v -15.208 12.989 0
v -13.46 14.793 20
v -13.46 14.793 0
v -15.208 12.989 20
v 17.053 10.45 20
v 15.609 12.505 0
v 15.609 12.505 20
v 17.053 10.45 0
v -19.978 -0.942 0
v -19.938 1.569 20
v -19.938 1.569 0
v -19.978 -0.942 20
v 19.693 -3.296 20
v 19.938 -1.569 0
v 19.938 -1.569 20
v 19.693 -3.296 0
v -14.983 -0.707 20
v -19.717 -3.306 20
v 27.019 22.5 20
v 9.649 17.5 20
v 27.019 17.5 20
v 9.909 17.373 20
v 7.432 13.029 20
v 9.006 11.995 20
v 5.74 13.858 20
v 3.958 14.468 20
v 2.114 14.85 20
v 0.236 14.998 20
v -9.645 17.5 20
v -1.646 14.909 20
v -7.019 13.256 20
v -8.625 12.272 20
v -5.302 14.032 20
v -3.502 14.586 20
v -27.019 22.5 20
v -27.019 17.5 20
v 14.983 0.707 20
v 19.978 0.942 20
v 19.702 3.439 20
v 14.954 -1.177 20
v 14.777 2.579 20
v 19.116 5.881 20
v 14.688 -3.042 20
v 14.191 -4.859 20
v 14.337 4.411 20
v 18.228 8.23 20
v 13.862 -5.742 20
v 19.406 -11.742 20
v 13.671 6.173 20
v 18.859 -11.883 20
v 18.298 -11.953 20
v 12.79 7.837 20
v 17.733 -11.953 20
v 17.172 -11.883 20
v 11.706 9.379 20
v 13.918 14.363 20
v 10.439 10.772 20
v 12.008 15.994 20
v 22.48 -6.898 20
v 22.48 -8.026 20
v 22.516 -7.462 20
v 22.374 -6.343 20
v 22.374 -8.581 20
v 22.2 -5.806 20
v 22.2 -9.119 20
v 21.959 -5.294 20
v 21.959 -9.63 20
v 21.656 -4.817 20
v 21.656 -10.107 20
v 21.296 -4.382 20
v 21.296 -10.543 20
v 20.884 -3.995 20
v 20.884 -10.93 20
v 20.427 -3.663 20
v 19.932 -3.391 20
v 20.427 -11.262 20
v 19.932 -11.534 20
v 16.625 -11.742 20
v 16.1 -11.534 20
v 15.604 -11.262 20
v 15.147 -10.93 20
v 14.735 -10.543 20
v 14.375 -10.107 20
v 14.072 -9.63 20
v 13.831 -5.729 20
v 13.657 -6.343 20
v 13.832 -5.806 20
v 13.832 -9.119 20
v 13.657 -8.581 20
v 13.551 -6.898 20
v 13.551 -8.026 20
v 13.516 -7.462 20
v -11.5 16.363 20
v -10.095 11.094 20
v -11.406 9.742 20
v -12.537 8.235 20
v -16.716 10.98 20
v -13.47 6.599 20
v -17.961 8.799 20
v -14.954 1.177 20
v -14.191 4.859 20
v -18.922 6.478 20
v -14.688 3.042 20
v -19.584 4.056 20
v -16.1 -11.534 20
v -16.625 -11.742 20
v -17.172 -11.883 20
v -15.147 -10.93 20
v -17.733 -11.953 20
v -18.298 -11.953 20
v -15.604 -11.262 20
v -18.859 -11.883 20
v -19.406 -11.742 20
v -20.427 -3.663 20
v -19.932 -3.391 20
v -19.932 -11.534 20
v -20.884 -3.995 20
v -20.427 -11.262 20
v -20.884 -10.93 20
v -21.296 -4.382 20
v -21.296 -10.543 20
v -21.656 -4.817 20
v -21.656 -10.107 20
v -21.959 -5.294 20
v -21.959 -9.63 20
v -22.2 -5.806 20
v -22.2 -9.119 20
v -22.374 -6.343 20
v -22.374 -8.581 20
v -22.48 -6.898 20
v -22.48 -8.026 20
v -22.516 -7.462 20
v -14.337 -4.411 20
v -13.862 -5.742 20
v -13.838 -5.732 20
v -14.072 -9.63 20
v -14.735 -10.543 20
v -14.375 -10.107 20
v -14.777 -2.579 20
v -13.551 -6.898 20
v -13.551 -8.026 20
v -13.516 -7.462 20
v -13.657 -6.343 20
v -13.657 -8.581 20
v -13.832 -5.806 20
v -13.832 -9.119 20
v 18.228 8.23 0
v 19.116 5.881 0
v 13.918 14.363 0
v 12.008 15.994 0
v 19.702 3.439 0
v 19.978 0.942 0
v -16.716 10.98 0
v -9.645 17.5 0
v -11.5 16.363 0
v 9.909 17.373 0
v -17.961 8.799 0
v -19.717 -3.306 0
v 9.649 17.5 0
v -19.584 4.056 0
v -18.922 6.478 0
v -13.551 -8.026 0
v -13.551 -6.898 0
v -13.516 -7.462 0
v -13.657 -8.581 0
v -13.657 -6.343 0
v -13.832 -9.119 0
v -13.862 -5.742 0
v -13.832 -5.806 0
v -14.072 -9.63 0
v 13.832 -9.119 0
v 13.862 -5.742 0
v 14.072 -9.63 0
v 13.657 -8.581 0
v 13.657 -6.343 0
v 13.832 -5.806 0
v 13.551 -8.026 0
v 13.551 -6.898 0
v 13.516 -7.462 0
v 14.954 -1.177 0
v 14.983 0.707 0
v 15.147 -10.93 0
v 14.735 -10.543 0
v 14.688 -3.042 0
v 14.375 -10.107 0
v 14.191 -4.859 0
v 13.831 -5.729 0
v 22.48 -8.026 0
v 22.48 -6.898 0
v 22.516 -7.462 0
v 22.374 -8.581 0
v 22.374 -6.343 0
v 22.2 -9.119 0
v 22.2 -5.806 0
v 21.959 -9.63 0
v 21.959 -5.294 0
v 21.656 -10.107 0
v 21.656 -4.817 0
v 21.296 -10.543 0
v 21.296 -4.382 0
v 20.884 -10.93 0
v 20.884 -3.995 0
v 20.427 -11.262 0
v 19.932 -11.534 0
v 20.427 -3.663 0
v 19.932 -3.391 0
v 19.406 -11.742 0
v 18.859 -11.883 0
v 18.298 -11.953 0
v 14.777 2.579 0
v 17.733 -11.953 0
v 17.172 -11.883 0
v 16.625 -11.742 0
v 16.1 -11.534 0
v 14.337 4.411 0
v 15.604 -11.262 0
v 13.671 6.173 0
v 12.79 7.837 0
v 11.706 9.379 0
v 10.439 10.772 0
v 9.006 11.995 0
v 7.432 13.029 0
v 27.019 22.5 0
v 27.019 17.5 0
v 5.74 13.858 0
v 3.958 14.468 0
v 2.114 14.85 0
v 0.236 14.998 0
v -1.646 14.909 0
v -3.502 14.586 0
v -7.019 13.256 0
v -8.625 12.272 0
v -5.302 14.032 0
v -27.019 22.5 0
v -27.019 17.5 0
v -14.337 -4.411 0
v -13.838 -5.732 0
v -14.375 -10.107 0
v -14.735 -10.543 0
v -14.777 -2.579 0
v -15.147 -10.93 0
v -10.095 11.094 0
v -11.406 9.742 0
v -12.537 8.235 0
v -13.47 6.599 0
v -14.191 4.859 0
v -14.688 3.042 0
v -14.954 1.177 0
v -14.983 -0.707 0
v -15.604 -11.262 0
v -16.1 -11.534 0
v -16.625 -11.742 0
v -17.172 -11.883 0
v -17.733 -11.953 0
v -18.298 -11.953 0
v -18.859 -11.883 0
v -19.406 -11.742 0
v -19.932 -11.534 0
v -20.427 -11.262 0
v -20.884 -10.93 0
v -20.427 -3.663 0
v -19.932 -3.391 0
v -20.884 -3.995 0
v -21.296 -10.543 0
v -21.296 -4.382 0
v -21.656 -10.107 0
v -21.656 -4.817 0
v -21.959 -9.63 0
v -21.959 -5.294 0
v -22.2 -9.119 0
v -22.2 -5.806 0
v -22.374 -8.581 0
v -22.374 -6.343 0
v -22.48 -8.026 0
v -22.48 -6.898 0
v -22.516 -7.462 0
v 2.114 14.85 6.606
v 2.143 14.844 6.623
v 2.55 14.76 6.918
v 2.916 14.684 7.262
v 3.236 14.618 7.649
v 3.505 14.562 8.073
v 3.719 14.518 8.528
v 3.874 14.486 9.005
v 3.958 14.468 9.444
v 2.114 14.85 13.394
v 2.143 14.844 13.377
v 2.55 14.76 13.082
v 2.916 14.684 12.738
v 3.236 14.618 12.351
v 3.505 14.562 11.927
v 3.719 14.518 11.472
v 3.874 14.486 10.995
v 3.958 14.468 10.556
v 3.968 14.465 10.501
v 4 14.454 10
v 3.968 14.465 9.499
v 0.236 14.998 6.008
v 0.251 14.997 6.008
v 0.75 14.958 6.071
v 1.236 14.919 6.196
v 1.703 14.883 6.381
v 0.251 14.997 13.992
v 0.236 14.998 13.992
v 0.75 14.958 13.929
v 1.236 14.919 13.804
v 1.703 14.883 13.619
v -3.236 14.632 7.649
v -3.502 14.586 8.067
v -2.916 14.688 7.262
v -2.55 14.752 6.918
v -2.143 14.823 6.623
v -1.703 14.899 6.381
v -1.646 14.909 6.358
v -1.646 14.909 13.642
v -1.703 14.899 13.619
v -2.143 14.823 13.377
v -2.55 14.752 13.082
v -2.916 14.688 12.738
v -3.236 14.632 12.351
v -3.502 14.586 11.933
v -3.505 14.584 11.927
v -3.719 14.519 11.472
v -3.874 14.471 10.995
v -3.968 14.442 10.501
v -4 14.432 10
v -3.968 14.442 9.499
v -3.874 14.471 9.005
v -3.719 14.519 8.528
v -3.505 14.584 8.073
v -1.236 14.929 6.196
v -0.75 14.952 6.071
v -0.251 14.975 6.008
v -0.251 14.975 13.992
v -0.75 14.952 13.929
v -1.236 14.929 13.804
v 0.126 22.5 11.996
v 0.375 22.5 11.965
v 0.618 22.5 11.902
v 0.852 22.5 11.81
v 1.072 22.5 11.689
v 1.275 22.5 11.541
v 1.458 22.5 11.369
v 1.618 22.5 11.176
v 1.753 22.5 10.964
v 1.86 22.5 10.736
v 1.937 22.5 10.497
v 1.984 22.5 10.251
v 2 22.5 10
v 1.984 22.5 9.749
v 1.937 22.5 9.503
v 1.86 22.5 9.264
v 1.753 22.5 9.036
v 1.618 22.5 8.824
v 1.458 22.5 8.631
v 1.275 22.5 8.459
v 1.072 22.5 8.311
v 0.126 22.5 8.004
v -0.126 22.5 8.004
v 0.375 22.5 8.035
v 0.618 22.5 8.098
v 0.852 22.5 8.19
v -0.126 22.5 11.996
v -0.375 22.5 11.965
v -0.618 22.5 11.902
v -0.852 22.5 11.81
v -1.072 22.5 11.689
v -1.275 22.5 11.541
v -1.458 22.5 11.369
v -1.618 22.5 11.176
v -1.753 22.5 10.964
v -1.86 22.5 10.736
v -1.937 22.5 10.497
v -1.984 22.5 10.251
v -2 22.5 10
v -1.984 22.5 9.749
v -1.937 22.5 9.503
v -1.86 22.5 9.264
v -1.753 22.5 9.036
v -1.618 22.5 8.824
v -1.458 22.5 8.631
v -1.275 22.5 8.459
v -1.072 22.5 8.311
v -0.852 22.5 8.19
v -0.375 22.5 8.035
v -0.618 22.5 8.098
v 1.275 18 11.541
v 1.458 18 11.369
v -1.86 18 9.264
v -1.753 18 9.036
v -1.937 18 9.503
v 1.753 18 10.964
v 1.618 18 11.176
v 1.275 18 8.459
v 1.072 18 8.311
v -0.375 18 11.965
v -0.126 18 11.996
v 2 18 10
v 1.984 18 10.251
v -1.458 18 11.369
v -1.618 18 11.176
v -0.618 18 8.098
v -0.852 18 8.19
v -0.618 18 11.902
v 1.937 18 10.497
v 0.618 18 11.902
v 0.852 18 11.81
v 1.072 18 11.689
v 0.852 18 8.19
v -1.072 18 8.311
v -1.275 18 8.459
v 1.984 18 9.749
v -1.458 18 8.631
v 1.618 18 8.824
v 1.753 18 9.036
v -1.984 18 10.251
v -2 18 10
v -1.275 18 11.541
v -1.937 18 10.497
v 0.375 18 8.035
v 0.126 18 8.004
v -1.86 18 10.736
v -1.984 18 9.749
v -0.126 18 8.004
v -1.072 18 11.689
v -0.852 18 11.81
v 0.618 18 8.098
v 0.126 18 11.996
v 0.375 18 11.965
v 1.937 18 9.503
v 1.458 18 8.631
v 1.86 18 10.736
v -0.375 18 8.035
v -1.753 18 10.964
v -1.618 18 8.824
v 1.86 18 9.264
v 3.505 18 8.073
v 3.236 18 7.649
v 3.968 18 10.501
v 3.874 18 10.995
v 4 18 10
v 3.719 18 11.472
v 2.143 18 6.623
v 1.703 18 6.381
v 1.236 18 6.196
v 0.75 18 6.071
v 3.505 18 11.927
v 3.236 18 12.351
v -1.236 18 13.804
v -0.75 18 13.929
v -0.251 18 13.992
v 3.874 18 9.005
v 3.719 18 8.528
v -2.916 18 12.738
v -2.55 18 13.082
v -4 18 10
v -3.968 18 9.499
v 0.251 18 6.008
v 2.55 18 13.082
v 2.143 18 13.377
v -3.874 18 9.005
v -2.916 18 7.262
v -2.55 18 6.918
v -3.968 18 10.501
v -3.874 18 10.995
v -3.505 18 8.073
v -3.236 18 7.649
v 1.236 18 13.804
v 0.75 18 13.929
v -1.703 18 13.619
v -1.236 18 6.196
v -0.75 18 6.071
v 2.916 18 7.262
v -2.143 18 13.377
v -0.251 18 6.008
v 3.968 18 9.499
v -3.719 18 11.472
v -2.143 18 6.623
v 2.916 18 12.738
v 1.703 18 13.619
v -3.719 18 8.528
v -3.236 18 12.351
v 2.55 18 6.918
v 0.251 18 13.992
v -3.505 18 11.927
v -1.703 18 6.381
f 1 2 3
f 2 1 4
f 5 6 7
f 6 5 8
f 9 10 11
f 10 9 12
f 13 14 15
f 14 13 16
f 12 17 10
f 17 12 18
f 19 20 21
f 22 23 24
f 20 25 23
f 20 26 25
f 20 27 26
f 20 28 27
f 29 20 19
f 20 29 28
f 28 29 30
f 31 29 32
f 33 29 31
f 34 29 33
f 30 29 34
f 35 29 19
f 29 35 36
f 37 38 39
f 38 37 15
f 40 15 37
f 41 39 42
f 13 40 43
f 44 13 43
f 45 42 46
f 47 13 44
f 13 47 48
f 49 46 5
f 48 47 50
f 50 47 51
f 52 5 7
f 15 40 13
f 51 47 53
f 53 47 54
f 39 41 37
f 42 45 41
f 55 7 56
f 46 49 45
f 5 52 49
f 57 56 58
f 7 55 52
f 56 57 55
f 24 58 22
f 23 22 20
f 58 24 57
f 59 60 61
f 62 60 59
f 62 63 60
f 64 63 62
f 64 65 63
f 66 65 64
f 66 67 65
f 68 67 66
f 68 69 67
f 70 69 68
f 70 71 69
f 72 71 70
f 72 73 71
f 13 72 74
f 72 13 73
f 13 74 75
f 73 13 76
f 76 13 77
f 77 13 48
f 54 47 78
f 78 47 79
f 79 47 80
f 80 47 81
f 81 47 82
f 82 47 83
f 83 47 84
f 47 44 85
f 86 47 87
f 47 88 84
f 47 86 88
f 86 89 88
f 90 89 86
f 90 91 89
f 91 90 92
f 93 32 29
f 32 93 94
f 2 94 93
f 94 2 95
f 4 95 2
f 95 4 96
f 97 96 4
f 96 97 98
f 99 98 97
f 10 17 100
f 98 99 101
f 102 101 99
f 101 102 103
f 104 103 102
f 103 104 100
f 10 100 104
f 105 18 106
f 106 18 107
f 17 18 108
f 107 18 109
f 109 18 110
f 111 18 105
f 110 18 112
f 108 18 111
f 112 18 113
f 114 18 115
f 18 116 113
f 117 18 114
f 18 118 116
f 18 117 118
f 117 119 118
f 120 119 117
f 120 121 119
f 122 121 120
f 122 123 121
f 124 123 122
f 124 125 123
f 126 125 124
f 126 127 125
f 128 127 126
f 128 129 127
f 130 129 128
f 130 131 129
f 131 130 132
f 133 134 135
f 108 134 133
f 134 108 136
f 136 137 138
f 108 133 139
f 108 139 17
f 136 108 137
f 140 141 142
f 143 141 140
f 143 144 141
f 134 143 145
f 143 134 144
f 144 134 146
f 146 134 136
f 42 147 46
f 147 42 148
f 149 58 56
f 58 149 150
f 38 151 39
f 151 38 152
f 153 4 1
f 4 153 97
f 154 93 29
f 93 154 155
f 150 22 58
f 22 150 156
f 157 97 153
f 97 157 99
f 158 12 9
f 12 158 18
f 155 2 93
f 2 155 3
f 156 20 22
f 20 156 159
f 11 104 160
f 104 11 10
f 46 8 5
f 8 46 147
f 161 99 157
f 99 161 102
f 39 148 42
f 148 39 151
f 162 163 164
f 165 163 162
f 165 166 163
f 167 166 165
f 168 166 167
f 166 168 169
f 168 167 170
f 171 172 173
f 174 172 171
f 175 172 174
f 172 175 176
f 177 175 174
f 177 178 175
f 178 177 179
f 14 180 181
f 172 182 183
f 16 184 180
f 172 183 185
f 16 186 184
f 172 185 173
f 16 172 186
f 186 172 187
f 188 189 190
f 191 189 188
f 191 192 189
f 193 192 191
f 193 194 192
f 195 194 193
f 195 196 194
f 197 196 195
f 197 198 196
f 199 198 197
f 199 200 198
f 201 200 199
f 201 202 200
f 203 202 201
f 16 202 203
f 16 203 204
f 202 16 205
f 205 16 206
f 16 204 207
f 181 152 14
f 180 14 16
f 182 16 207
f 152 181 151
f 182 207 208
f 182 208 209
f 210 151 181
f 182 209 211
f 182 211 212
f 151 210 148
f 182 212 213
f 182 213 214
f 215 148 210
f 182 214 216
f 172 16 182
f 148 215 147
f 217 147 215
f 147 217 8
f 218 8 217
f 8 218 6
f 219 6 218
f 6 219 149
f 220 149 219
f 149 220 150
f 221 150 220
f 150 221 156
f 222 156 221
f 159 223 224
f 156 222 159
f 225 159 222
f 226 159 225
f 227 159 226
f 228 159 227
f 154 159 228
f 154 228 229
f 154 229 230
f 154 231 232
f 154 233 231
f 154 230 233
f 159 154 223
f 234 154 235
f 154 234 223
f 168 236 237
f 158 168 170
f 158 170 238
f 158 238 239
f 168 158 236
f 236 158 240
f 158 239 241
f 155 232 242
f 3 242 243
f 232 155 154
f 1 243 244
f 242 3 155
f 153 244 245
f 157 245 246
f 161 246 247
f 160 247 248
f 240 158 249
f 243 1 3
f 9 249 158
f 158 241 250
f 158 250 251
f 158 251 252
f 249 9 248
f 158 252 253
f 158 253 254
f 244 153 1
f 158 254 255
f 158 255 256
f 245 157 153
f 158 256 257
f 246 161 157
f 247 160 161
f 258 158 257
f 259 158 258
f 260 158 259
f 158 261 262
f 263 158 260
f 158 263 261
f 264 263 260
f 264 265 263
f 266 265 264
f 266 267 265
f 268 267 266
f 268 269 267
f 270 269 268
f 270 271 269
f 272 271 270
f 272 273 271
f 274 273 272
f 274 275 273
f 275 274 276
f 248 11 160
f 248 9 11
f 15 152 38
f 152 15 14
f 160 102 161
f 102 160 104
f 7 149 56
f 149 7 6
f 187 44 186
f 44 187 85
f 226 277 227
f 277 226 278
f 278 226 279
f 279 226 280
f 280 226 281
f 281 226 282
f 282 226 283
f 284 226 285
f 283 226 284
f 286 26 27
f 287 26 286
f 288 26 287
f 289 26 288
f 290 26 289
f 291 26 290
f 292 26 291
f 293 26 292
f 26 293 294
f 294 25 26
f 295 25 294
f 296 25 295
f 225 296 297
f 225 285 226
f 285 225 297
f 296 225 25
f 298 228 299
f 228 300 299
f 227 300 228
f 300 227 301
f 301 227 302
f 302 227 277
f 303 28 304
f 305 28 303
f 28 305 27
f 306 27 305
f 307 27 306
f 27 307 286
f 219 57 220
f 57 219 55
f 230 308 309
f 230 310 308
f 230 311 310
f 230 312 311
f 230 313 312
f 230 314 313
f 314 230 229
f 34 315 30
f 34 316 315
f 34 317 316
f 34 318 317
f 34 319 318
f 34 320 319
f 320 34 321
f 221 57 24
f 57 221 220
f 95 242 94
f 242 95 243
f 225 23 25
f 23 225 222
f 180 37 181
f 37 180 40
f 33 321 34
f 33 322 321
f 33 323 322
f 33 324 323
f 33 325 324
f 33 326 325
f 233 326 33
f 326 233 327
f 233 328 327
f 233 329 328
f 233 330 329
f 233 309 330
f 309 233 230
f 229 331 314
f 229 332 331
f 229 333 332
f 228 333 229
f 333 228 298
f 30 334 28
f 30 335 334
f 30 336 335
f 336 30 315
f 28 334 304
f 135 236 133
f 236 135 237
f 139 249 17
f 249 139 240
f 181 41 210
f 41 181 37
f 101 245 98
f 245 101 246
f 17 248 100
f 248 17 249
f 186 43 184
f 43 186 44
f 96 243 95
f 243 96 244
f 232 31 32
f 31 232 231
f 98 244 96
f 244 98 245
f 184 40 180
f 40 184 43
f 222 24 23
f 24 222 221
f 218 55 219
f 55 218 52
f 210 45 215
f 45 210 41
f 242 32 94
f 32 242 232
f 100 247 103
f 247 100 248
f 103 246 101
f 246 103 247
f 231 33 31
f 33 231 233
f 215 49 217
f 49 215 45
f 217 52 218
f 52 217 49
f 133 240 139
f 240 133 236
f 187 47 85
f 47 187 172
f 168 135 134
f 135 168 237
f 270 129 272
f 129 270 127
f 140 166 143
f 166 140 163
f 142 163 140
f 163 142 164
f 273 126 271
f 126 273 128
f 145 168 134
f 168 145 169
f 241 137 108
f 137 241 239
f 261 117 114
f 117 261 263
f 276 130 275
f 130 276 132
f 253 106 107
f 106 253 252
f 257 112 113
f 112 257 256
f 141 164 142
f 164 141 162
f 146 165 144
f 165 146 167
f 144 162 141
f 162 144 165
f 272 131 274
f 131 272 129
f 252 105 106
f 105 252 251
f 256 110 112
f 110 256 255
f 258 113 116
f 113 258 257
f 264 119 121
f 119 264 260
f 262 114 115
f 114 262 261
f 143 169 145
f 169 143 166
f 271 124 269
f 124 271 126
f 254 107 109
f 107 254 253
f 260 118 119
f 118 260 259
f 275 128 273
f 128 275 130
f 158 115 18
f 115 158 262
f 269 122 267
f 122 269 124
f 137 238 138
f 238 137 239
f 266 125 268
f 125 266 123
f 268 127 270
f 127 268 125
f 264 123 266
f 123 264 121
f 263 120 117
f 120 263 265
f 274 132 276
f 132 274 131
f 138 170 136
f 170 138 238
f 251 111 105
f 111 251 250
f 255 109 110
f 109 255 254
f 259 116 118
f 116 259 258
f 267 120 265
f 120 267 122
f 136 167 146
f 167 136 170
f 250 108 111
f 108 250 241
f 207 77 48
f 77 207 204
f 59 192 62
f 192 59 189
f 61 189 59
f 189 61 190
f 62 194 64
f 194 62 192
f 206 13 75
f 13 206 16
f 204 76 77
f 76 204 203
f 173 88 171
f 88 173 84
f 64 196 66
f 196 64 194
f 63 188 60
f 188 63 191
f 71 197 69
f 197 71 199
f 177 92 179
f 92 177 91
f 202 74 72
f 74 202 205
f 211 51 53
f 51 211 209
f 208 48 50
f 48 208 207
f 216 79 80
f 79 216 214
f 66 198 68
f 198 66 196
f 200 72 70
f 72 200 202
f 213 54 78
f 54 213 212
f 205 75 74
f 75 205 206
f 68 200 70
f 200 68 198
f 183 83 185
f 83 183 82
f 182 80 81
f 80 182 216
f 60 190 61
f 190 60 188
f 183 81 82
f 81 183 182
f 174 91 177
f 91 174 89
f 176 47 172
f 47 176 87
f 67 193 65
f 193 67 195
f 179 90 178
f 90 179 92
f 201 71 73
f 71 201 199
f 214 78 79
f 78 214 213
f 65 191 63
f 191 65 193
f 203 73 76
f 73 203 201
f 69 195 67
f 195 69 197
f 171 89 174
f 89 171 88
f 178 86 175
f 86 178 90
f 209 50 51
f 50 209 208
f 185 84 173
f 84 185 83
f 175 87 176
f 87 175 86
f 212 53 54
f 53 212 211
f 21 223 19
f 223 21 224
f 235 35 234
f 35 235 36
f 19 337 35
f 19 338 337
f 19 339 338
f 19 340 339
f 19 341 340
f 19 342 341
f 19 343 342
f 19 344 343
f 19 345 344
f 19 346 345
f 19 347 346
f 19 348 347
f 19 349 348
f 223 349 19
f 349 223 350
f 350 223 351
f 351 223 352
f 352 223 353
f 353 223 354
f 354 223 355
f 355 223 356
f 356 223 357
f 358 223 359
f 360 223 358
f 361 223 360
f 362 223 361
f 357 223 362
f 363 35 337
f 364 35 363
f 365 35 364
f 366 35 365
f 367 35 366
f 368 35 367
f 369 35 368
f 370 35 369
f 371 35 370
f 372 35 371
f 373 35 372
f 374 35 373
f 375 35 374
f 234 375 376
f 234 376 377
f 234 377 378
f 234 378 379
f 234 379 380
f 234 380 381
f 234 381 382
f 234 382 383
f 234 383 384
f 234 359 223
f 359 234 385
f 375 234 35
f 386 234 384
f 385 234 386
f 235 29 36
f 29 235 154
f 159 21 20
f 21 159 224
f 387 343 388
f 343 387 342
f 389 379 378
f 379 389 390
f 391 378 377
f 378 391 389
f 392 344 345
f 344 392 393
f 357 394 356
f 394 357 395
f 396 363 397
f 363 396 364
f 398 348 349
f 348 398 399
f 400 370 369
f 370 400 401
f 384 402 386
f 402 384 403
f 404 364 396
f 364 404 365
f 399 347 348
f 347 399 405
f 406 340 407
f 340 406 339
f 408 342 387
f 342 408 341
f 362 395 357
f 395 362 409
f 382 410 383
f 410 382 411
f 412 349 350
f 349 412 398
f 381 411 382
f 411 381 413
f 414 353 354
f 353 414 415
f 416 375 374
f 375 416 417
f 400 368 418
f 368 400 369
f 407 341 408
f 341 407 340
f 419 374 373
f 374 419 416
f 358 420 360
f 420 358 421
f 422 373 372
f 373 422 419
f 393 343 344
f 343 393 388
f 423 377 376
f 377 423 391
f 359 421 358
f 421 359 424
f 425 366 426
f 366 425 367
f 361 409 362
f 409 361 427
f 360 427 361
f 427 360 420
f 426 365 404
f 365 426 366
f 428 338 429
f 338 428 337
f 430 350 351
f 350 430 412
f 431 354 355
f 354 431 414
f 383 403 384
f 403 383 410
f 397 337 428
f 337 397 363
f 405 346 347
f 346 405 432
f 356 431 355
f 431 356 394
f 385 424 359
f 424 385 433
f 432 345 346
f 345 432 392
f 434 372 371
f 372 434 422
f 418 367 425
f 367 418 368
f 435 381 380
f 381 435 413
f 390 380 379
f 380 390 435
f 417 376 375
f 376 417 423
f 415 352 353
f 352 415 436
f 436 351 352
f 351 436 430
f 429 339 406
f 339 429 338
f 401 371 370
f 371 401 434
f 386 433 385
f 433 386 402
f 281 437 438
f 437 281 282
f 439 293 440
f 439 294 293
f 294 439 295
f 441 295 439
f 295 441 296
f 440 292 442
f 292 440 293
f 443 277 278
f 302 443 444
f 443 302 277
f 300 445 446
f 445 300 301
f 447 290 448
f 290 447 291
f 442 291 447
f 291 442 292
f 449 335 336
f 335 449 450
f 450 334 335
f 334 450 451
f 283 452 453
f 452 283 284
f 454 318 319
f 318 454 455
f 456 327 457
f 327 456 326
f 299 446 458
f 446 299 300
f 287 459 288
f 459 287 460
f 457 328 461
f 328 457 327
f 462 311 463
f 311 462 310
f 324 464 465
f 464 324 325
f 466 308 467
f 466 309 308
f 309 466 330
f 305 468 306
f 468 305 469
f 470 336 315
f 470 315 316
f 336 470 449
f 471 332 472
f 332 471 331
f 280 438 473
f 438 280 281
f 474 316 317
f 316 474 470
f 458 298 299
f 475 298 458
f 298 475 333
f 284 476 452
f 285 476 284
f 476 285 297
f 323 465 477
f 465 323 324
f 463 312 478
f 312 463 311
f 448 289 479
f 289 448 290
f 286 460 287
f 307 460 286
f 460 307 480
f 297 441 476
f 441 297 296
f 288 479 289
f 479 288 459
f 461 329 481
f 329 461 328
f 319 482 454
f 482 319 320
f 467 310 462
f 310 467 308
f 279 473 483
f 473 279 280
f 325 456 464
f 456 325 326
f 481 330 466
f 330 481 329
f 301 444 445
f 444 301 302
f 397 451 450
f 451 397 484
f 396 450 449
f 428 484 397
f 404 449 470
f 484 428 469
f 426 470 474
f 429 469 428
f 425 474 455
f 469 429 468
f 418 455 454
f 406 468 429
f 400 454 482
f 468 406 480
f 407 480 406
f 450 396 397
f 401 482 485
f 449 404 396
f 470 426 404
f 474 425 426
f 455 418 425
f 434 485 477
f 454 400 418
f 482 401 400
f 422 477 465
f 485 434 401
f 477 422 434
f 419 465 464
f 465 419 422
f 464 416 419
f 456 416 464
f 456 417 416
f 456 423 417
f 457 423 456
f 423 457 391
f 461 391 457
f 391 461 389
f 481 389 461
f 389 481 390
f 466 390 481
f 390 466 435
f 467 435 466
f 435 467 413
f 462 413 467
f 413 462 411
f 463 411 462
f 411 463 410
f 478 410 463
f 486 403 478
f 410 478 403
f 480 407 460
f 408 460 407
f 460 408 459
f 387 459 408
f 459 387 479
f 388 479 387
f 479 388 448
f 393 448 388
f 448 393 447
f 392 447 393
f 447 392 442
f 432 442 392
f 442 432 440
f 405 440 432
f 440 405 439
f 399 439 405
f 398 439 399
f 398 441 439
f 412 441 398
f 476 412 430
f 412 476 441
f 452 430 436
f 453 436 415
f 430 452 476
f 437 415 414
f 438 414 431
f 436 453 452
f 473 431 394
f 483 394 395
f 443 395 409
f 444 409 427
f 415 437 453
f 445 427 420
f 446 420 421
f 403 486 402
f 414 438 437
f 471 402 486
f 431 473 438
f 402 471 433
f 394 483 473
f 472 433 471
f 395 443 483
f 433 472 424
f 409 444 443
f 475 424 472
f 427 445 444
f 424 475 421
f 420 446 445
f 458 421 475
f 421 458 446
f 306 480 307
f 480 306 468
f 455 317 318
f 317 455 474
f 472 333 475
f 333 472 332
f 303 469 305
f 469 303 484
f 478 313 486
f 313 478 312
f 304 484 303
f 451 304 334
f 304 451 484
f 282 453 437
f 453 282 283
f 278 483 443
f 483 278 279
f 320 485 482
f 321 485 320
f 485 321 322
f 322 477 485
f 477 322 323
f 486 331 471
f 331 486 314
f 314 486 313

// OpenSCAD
// Custom wall tube holder
// By Magonegro SEP-2016

// Inner diameter:
DIAMETER=30;
// Height:
HEIGHT=20;
// Thickness:
THICKNESS=5;
// Aperture angle (typ. 140º):
ANGLE=135;
// Hole diameter (mm):
HOLEDIAMETER=4;
// # Holders:
HOLDERS=1;
// Resolution
FACETS=50;

/* [Hidden] */
module arc( height, depth, radius, degrees ) 
{
    render() 
    {
        difference() 
        {
            rotate_extrude(angle=360,$fn = FACETS)
                translate([radius - height, 0, 0])
                    square([height,depth]);
            translate([0,-(radius+1),-.5]) 
                cube([radius+1,(radius+1)*2,depth+1]);
            rotate([0,0,180-degrees]) 
                translate([0,-(radius+1),-.5]) 
                    cube([radius+1,(radius+1)*2,depth+1]);
        }
    }
}

// Some variables
R2=(THICKNESS/2)*1.8; // Gripper radius
R=(DIAMETER/2)+R2; // Radius for the center of the grippers
XX=R*sin(ANGLE/2); // X coordinate of the center of the grippers
YY=R*cos(ANGLE/2); // Y coordinate of the center of the grippers

union()
{
    for (holder=[0:HOLDERS-1])
    {
        translate([((XX+R2)*1.2*2-0.1)*holder,0,0])
        difference()
        {
            union()
            {
                difference()
                {
                    rotate([0,0,ANGLE/2]) 
                        difference()
                        {
                        cylinder(r=DIAMETER/2+THICKNESS,h=HEIGHT,$fn=FACETS);
                        translate([0,0,-1]) cylinder(r=DIAMETER/2,h=HEIGHT+2,$fn=FACETS);
                        }
                    rotate([0,0,ANGLE/2]) 
                        translate([0,0,-1]) 
                            arc(THICKNESS+2,HEIGHT+2,DIAMETER/2+THICKNESS+1,ANGLE);
                }
                translate([-XX,-YY,0]) cylinder(r=R2,h=HEIGHT,$fn=FACETS);
                translate([XX,-YY,0]) cylinder(r=R2,h=HEIGHT,$fn=FACETS);
                // Support to wall
                translate([-(XX+R2)*1.2,(DIAMETER+THICKNESS)/2,0]) 
                    cube([(XX+R2)*1.2*2,THICKNESS,HEIGHT]);
            }
            // Screw holes allowing for the screw head
            translate([0,(DIAMETER+THICKNESS)/2+THICKNESS+0.5,HEIGHT/2])
            rotate([90,0,0])
            union()
            {
                cylinder(r=HOLEDIAMETER/2,h=HEIGHT,$fn=FACETS);
                translate([0,0,THICKNESS]) 
                    cylinder(r=HOLEDIAMETER,h=HEIGHT,$fn=FACETS);
            }
        }
    }
}
